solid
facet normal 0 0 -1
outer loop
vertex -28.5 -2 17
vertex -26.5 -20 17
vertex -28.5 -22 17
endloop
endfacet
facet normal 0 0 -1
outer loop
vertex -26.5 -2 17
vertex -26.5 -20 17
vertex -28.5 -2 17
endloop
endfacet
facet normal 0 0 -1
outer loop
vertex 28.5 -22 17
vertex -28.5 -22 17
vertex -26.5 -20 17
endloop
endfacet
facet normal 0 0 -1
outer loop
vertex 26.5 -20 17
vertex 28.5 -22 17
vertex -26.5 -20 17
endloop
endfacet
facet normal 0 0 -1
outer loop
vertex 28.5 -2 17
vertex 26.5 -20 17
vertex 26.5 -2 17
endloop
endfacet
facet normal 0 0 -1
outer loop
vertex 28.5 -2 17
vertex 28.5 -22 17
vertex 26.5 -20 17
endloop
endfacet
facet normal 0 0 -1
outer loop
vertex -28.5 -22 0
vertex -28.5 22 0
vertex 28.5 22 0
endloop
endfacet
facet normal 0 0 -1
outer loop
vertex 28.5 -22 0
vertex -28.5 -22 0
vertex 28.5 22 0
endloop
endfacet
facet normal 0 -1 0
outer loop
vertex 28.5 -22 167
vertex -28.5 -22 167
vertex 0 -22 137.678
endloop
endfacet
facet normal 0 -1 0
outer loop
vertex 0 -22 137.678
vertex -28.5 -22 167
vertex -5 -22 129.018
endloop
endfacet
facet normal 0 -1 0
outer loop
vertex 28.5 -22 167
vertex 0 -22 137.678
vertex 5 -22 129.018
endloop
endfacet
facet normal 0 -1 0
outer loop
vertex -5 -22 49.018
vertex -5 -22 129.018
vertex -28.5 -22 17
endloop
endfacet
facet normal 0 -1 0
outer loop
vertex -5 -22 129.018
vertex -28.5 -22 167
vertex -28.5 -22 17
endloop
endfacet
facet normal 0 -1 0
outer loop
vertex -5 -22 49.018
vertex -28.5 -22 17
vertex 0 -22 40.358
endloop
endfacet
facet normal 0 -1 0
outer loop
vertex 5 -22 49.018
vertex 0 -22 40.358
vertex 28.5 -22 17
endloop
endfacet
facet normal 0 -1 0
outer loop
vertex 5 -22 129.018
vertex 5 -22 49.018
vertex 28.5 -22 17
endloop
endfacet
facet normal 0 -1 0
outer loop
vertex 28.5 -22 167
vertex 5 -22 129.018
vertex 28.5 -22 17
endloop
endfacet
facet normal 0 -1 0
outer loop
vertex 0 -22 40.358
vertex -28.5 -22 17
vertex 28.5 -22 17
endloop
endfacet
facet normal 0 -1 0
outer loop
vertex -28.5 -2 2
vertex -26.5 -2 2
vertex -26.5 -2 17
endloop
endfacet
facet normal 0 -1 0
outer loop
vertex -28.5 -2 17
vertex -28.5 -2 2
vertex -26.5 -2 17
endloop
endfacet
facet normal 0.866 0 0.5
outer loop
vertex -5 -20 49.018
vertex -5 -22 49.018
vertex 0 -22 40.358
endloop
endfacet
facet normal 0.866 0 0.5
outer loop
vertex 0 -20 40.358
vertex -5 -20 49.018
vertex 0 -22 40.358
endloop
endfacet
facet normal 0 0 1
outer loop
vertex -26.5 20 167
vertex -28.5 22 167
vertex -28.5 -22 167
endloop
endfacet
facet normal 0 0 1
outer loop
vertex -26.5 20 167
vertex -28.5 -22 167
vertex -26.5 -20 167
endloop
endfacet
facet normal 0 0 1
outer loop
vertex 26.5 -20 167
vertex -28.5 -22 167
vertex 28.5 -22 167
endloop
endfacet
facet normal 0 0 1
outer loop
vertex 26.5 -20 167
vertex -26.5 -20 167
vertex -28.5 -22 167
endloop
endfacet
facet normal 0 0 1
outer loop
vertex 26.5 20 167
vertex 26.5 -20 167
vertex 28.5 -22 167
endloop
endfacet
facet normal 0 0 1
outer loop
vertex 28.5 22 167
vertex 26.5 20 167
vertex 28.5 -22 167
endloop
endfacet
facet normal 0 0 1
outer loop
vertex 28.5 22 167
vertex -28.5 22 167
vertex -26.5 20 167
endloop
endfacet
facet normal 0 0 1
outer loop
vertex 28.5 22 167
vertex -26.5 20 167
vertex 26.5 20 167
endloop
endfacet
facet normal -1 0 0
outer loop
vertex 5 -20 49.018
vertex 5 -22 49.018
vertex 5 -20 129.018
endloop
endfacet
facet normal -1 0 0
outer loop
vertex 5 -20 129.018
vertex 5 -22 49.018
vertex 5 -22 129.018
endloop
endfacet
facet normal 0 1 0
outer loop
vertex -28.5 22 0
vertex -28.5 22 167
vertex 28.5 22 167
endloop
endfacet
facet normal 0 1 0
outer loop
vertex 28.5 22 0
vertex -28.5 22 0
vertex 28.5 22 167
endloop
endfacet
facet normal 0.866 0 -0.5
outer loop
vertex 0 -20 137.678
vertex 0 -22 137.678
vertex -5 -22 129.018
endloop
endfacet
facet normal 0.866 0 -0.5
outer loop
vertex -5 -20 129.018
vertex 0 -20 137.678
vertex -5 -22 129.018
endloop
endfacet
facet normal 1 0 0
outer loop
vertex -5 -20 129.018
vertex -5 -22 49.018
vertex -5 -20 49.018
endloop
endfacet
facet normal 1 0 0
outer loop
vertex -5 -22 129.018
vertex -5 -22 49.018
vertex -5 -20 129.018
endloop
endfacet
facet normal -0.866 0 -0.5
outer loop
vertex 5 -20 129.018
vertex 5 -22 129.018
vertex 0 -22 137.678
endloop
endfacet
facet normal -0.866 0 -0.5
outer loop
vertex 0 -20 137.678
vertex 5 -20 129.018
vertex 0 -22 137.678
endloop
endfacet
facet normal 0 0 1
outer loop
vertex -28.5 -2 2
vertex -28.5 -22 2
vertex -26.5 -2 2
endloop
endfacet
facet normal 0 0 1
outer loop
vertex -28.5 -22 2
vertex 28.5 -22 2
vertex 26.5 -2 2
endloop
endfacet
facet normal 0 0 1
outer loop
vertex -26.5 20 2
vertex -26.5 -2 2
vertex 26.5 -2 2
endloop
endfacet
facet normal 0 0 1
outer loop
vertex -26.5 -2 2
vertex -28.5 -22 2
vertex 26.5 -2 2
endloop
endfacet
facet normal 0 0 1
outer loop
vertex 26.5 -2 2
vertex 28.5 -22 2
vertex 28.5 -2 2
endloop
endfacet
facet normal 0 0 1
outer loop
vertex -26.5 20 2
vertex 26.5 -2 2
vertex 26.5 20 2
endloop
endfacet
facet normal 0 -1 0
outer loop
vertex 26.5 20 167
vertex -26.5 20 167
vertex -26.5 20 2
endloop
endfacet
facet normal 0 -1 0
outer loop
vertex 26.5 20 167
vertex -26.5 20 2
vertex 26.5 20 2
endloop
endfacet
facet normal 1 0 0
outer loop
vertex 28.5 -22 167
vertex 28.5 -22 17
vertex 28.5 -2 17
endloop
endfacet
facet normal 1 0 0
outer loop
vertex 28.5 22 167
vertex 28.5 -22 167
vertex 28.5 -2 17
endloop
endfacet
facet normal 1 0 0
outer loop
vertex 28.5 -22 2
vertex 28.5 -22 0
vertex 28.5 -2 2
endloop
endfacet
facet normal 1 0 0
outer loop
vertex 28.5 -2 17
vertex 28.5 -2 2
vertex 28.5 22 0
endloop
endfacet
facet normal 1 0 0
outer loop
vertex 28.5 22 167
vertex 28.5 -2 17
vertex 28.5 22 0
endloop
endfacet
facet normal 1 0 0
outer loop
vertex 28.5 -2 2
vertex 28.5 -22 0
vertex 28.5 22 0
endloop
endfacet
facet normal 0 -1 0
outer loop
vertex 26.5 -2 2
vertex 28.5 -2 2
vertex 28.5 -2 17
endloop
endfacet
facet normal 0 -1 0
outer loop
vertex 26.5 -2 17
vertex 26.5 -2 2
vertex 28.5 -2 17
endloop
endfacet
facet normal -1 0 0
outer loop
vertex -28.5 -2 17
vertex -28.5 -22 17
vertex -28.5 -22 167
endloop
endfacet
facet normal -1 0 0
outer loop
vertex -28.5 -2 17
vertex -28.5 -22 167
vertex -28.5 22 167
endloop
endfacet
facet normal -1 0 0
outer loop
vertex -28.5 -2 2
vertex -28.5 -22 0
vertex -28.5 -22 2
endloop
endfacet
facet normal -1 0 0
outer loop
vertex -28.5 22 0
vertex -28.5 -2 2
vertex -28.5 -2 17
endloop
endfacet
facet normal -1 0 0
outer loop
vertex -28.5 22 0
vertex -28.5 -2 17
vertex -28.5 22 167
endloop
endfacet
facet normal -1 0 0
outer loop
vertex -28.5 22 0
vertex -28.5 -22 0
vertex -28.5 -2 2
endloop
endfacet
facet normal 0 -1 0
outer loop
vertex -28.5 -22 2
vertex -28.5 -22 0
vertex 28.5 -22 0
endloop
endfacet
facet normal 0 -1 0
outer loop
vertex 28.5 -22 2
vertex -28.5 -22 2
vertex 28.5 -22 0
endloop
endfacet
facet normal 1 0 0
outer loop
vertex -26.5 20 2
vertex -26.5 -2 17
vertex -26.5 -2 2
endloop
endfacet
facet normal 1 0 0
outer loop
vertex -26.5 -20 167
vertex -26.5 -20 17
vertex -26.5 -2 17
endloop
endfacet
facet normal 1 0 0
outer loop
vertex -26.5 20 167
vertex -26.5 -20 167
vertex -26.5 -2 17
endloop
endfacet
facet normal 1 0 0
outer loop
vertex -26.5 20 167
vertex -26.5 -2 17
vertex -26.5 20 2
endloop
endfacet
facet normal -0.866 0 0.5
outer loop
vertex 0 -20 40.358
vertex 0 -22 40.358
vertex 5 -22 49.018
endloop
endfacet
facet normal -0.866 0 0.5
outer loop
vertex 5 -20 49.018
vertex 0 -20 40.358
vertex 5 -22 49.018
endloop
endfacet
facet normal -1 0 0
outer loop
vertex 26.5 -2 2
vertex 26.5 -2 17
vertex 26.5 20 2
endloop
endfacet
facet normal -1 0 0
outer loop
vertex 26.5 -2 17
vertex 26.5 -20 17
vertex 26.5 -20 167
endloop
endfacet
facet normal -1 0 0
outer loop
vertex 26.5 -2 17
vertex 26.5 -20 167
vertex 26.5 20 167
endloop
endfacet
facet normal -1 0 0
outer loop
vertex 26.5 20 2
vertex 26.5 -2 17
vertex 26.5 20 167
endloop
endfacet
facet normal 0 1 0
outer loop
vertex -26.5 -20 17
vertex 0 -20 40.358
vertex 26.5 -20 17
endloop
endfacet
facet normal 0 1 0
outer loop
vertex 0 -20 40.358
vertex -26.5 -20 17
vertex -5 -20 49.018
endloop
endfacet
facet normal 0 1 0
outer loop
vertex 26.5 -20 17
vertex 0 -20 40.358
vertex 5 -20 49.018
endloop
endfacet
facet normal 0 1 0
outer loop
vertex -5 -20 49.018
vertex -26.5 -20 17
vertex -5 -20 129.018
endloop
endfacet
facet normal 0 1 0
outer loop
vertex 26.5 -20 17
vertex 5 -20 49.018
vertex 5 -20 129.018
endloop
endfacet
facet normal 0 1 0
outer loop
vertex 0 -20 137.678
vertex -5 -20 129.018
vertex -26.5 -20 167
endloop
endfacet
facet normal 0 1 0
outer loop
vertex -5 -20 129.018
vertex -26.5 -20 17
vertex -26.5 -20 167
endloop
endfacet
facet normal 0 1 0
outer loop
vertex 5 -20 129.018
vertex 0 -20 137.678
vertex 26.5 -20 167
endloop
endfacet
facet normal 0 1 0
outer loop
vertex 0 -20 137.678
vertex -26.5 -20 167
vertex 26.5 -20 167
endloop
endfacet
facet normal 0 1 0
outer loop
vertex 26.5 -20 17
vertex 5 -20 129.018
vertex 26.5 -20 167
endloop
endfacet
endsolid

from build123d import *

# Parameters (mm, degrees)
F0_W     = 57
F0_H     = 44
F1_DEPTH = 167
F2_W     = 53
F2_H     = 40
F3_DEPTH = 165
F4_W     = 20
F4_H     = 15
F5_DEPTH = 84
F6_W     = 10
F6_H     = 80
F7_DEPTH = 2


with BuildPart() as f1:
    # F0 (on Top) → F1 (new body)
    with BuildSketch(Plane.XY):
        Rectangle(F0_W, F0_H)
    extrude(amount=F1_DEPTH)

    # F2 (on face) → F3 (cut)
    with BuildSketch(Plane.XY.offset(167)):
        Rectangle(F2_W, F2_H)
    extrude(amount=-F3_DEPTH, mode=Mode.SUBTRACT)

    # F4 (on face) → F5 (cut)
    with BuildSketch(Plane.YZ.offset(28.5)):
        with Locations((-12, 9.5)):
            Rectangle(F4_W, F4_H)
    extrude(amount=-F5_DEPTH, mode=Mode.SUBTRACT)

    # F6 (on face) → F7 (cut)
    with BuildSketch(Plane.XZ.offset(22)):
        Polygon((5, 49.017786), (-5, 49.017786), (0, 40.357532), align=None)
        with Locations((0, 89.017786)):
            Rectangle(F6_W, F6_H)
        Polygon((0, 137.67804), (-5, 129.017786), (5, 129.017786), align=None)
    extrude(amount=-F7_DEPTH, mode=Mode.SUBTRACT)


solid = f1.part
